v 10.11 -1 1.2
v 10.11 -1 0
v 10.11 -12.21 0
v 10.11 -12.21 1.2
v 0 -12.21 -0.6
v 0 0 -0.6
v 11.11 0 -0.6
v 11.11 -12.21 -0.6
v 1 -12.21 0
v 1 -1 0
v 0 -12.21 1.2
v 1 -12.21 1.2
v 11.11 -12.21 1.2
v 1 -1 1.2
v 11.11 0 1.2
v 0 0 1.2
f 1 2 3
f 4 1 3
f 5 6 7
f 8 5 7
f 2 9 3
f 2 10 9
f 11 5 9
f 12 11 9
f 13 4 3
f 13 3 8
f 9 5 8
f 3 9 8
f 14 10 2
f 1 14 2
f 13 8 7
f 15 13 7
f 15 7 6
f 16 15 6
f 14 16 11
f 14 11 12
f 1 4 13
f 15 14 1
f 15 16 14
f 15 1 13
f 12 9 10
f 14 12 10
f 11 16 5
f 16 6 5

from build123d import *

# Parameters (mm, degrees)
F0_W     = 9.11
F0_H     = 11.21
F1_DEPTH = 0.6
F2_DEPTH = 1.2


with BuildPart() as f1:
    # F0 (on Top) → F1 (new body)
    with BuildSketch(Plane.XY):
        Polygon((11.11, 0), (0, 0), (0, -12.21), (1, -12.21), (1, -1), (10.11, -1), (10.11, -12.21), (11.11, -12.21), align=None)
        with Locations((5.555, -6.605)):
            Rectangle(F0_W, F0_H)
    extrude(amount=-F1_DEPTH)

    # F0 (on Top) → F2 (join)
    with BuildSketch(Plane.XY):
        Polygon((11.11, 0), (0, 0), (0, -12.21), (1, -12.21), (1, -1), (10.11, -1), (10.11, -12.21), (11.11, -12.21), align=None)
    extrude(amount=F2_DEPTH)


solid = f1.part
